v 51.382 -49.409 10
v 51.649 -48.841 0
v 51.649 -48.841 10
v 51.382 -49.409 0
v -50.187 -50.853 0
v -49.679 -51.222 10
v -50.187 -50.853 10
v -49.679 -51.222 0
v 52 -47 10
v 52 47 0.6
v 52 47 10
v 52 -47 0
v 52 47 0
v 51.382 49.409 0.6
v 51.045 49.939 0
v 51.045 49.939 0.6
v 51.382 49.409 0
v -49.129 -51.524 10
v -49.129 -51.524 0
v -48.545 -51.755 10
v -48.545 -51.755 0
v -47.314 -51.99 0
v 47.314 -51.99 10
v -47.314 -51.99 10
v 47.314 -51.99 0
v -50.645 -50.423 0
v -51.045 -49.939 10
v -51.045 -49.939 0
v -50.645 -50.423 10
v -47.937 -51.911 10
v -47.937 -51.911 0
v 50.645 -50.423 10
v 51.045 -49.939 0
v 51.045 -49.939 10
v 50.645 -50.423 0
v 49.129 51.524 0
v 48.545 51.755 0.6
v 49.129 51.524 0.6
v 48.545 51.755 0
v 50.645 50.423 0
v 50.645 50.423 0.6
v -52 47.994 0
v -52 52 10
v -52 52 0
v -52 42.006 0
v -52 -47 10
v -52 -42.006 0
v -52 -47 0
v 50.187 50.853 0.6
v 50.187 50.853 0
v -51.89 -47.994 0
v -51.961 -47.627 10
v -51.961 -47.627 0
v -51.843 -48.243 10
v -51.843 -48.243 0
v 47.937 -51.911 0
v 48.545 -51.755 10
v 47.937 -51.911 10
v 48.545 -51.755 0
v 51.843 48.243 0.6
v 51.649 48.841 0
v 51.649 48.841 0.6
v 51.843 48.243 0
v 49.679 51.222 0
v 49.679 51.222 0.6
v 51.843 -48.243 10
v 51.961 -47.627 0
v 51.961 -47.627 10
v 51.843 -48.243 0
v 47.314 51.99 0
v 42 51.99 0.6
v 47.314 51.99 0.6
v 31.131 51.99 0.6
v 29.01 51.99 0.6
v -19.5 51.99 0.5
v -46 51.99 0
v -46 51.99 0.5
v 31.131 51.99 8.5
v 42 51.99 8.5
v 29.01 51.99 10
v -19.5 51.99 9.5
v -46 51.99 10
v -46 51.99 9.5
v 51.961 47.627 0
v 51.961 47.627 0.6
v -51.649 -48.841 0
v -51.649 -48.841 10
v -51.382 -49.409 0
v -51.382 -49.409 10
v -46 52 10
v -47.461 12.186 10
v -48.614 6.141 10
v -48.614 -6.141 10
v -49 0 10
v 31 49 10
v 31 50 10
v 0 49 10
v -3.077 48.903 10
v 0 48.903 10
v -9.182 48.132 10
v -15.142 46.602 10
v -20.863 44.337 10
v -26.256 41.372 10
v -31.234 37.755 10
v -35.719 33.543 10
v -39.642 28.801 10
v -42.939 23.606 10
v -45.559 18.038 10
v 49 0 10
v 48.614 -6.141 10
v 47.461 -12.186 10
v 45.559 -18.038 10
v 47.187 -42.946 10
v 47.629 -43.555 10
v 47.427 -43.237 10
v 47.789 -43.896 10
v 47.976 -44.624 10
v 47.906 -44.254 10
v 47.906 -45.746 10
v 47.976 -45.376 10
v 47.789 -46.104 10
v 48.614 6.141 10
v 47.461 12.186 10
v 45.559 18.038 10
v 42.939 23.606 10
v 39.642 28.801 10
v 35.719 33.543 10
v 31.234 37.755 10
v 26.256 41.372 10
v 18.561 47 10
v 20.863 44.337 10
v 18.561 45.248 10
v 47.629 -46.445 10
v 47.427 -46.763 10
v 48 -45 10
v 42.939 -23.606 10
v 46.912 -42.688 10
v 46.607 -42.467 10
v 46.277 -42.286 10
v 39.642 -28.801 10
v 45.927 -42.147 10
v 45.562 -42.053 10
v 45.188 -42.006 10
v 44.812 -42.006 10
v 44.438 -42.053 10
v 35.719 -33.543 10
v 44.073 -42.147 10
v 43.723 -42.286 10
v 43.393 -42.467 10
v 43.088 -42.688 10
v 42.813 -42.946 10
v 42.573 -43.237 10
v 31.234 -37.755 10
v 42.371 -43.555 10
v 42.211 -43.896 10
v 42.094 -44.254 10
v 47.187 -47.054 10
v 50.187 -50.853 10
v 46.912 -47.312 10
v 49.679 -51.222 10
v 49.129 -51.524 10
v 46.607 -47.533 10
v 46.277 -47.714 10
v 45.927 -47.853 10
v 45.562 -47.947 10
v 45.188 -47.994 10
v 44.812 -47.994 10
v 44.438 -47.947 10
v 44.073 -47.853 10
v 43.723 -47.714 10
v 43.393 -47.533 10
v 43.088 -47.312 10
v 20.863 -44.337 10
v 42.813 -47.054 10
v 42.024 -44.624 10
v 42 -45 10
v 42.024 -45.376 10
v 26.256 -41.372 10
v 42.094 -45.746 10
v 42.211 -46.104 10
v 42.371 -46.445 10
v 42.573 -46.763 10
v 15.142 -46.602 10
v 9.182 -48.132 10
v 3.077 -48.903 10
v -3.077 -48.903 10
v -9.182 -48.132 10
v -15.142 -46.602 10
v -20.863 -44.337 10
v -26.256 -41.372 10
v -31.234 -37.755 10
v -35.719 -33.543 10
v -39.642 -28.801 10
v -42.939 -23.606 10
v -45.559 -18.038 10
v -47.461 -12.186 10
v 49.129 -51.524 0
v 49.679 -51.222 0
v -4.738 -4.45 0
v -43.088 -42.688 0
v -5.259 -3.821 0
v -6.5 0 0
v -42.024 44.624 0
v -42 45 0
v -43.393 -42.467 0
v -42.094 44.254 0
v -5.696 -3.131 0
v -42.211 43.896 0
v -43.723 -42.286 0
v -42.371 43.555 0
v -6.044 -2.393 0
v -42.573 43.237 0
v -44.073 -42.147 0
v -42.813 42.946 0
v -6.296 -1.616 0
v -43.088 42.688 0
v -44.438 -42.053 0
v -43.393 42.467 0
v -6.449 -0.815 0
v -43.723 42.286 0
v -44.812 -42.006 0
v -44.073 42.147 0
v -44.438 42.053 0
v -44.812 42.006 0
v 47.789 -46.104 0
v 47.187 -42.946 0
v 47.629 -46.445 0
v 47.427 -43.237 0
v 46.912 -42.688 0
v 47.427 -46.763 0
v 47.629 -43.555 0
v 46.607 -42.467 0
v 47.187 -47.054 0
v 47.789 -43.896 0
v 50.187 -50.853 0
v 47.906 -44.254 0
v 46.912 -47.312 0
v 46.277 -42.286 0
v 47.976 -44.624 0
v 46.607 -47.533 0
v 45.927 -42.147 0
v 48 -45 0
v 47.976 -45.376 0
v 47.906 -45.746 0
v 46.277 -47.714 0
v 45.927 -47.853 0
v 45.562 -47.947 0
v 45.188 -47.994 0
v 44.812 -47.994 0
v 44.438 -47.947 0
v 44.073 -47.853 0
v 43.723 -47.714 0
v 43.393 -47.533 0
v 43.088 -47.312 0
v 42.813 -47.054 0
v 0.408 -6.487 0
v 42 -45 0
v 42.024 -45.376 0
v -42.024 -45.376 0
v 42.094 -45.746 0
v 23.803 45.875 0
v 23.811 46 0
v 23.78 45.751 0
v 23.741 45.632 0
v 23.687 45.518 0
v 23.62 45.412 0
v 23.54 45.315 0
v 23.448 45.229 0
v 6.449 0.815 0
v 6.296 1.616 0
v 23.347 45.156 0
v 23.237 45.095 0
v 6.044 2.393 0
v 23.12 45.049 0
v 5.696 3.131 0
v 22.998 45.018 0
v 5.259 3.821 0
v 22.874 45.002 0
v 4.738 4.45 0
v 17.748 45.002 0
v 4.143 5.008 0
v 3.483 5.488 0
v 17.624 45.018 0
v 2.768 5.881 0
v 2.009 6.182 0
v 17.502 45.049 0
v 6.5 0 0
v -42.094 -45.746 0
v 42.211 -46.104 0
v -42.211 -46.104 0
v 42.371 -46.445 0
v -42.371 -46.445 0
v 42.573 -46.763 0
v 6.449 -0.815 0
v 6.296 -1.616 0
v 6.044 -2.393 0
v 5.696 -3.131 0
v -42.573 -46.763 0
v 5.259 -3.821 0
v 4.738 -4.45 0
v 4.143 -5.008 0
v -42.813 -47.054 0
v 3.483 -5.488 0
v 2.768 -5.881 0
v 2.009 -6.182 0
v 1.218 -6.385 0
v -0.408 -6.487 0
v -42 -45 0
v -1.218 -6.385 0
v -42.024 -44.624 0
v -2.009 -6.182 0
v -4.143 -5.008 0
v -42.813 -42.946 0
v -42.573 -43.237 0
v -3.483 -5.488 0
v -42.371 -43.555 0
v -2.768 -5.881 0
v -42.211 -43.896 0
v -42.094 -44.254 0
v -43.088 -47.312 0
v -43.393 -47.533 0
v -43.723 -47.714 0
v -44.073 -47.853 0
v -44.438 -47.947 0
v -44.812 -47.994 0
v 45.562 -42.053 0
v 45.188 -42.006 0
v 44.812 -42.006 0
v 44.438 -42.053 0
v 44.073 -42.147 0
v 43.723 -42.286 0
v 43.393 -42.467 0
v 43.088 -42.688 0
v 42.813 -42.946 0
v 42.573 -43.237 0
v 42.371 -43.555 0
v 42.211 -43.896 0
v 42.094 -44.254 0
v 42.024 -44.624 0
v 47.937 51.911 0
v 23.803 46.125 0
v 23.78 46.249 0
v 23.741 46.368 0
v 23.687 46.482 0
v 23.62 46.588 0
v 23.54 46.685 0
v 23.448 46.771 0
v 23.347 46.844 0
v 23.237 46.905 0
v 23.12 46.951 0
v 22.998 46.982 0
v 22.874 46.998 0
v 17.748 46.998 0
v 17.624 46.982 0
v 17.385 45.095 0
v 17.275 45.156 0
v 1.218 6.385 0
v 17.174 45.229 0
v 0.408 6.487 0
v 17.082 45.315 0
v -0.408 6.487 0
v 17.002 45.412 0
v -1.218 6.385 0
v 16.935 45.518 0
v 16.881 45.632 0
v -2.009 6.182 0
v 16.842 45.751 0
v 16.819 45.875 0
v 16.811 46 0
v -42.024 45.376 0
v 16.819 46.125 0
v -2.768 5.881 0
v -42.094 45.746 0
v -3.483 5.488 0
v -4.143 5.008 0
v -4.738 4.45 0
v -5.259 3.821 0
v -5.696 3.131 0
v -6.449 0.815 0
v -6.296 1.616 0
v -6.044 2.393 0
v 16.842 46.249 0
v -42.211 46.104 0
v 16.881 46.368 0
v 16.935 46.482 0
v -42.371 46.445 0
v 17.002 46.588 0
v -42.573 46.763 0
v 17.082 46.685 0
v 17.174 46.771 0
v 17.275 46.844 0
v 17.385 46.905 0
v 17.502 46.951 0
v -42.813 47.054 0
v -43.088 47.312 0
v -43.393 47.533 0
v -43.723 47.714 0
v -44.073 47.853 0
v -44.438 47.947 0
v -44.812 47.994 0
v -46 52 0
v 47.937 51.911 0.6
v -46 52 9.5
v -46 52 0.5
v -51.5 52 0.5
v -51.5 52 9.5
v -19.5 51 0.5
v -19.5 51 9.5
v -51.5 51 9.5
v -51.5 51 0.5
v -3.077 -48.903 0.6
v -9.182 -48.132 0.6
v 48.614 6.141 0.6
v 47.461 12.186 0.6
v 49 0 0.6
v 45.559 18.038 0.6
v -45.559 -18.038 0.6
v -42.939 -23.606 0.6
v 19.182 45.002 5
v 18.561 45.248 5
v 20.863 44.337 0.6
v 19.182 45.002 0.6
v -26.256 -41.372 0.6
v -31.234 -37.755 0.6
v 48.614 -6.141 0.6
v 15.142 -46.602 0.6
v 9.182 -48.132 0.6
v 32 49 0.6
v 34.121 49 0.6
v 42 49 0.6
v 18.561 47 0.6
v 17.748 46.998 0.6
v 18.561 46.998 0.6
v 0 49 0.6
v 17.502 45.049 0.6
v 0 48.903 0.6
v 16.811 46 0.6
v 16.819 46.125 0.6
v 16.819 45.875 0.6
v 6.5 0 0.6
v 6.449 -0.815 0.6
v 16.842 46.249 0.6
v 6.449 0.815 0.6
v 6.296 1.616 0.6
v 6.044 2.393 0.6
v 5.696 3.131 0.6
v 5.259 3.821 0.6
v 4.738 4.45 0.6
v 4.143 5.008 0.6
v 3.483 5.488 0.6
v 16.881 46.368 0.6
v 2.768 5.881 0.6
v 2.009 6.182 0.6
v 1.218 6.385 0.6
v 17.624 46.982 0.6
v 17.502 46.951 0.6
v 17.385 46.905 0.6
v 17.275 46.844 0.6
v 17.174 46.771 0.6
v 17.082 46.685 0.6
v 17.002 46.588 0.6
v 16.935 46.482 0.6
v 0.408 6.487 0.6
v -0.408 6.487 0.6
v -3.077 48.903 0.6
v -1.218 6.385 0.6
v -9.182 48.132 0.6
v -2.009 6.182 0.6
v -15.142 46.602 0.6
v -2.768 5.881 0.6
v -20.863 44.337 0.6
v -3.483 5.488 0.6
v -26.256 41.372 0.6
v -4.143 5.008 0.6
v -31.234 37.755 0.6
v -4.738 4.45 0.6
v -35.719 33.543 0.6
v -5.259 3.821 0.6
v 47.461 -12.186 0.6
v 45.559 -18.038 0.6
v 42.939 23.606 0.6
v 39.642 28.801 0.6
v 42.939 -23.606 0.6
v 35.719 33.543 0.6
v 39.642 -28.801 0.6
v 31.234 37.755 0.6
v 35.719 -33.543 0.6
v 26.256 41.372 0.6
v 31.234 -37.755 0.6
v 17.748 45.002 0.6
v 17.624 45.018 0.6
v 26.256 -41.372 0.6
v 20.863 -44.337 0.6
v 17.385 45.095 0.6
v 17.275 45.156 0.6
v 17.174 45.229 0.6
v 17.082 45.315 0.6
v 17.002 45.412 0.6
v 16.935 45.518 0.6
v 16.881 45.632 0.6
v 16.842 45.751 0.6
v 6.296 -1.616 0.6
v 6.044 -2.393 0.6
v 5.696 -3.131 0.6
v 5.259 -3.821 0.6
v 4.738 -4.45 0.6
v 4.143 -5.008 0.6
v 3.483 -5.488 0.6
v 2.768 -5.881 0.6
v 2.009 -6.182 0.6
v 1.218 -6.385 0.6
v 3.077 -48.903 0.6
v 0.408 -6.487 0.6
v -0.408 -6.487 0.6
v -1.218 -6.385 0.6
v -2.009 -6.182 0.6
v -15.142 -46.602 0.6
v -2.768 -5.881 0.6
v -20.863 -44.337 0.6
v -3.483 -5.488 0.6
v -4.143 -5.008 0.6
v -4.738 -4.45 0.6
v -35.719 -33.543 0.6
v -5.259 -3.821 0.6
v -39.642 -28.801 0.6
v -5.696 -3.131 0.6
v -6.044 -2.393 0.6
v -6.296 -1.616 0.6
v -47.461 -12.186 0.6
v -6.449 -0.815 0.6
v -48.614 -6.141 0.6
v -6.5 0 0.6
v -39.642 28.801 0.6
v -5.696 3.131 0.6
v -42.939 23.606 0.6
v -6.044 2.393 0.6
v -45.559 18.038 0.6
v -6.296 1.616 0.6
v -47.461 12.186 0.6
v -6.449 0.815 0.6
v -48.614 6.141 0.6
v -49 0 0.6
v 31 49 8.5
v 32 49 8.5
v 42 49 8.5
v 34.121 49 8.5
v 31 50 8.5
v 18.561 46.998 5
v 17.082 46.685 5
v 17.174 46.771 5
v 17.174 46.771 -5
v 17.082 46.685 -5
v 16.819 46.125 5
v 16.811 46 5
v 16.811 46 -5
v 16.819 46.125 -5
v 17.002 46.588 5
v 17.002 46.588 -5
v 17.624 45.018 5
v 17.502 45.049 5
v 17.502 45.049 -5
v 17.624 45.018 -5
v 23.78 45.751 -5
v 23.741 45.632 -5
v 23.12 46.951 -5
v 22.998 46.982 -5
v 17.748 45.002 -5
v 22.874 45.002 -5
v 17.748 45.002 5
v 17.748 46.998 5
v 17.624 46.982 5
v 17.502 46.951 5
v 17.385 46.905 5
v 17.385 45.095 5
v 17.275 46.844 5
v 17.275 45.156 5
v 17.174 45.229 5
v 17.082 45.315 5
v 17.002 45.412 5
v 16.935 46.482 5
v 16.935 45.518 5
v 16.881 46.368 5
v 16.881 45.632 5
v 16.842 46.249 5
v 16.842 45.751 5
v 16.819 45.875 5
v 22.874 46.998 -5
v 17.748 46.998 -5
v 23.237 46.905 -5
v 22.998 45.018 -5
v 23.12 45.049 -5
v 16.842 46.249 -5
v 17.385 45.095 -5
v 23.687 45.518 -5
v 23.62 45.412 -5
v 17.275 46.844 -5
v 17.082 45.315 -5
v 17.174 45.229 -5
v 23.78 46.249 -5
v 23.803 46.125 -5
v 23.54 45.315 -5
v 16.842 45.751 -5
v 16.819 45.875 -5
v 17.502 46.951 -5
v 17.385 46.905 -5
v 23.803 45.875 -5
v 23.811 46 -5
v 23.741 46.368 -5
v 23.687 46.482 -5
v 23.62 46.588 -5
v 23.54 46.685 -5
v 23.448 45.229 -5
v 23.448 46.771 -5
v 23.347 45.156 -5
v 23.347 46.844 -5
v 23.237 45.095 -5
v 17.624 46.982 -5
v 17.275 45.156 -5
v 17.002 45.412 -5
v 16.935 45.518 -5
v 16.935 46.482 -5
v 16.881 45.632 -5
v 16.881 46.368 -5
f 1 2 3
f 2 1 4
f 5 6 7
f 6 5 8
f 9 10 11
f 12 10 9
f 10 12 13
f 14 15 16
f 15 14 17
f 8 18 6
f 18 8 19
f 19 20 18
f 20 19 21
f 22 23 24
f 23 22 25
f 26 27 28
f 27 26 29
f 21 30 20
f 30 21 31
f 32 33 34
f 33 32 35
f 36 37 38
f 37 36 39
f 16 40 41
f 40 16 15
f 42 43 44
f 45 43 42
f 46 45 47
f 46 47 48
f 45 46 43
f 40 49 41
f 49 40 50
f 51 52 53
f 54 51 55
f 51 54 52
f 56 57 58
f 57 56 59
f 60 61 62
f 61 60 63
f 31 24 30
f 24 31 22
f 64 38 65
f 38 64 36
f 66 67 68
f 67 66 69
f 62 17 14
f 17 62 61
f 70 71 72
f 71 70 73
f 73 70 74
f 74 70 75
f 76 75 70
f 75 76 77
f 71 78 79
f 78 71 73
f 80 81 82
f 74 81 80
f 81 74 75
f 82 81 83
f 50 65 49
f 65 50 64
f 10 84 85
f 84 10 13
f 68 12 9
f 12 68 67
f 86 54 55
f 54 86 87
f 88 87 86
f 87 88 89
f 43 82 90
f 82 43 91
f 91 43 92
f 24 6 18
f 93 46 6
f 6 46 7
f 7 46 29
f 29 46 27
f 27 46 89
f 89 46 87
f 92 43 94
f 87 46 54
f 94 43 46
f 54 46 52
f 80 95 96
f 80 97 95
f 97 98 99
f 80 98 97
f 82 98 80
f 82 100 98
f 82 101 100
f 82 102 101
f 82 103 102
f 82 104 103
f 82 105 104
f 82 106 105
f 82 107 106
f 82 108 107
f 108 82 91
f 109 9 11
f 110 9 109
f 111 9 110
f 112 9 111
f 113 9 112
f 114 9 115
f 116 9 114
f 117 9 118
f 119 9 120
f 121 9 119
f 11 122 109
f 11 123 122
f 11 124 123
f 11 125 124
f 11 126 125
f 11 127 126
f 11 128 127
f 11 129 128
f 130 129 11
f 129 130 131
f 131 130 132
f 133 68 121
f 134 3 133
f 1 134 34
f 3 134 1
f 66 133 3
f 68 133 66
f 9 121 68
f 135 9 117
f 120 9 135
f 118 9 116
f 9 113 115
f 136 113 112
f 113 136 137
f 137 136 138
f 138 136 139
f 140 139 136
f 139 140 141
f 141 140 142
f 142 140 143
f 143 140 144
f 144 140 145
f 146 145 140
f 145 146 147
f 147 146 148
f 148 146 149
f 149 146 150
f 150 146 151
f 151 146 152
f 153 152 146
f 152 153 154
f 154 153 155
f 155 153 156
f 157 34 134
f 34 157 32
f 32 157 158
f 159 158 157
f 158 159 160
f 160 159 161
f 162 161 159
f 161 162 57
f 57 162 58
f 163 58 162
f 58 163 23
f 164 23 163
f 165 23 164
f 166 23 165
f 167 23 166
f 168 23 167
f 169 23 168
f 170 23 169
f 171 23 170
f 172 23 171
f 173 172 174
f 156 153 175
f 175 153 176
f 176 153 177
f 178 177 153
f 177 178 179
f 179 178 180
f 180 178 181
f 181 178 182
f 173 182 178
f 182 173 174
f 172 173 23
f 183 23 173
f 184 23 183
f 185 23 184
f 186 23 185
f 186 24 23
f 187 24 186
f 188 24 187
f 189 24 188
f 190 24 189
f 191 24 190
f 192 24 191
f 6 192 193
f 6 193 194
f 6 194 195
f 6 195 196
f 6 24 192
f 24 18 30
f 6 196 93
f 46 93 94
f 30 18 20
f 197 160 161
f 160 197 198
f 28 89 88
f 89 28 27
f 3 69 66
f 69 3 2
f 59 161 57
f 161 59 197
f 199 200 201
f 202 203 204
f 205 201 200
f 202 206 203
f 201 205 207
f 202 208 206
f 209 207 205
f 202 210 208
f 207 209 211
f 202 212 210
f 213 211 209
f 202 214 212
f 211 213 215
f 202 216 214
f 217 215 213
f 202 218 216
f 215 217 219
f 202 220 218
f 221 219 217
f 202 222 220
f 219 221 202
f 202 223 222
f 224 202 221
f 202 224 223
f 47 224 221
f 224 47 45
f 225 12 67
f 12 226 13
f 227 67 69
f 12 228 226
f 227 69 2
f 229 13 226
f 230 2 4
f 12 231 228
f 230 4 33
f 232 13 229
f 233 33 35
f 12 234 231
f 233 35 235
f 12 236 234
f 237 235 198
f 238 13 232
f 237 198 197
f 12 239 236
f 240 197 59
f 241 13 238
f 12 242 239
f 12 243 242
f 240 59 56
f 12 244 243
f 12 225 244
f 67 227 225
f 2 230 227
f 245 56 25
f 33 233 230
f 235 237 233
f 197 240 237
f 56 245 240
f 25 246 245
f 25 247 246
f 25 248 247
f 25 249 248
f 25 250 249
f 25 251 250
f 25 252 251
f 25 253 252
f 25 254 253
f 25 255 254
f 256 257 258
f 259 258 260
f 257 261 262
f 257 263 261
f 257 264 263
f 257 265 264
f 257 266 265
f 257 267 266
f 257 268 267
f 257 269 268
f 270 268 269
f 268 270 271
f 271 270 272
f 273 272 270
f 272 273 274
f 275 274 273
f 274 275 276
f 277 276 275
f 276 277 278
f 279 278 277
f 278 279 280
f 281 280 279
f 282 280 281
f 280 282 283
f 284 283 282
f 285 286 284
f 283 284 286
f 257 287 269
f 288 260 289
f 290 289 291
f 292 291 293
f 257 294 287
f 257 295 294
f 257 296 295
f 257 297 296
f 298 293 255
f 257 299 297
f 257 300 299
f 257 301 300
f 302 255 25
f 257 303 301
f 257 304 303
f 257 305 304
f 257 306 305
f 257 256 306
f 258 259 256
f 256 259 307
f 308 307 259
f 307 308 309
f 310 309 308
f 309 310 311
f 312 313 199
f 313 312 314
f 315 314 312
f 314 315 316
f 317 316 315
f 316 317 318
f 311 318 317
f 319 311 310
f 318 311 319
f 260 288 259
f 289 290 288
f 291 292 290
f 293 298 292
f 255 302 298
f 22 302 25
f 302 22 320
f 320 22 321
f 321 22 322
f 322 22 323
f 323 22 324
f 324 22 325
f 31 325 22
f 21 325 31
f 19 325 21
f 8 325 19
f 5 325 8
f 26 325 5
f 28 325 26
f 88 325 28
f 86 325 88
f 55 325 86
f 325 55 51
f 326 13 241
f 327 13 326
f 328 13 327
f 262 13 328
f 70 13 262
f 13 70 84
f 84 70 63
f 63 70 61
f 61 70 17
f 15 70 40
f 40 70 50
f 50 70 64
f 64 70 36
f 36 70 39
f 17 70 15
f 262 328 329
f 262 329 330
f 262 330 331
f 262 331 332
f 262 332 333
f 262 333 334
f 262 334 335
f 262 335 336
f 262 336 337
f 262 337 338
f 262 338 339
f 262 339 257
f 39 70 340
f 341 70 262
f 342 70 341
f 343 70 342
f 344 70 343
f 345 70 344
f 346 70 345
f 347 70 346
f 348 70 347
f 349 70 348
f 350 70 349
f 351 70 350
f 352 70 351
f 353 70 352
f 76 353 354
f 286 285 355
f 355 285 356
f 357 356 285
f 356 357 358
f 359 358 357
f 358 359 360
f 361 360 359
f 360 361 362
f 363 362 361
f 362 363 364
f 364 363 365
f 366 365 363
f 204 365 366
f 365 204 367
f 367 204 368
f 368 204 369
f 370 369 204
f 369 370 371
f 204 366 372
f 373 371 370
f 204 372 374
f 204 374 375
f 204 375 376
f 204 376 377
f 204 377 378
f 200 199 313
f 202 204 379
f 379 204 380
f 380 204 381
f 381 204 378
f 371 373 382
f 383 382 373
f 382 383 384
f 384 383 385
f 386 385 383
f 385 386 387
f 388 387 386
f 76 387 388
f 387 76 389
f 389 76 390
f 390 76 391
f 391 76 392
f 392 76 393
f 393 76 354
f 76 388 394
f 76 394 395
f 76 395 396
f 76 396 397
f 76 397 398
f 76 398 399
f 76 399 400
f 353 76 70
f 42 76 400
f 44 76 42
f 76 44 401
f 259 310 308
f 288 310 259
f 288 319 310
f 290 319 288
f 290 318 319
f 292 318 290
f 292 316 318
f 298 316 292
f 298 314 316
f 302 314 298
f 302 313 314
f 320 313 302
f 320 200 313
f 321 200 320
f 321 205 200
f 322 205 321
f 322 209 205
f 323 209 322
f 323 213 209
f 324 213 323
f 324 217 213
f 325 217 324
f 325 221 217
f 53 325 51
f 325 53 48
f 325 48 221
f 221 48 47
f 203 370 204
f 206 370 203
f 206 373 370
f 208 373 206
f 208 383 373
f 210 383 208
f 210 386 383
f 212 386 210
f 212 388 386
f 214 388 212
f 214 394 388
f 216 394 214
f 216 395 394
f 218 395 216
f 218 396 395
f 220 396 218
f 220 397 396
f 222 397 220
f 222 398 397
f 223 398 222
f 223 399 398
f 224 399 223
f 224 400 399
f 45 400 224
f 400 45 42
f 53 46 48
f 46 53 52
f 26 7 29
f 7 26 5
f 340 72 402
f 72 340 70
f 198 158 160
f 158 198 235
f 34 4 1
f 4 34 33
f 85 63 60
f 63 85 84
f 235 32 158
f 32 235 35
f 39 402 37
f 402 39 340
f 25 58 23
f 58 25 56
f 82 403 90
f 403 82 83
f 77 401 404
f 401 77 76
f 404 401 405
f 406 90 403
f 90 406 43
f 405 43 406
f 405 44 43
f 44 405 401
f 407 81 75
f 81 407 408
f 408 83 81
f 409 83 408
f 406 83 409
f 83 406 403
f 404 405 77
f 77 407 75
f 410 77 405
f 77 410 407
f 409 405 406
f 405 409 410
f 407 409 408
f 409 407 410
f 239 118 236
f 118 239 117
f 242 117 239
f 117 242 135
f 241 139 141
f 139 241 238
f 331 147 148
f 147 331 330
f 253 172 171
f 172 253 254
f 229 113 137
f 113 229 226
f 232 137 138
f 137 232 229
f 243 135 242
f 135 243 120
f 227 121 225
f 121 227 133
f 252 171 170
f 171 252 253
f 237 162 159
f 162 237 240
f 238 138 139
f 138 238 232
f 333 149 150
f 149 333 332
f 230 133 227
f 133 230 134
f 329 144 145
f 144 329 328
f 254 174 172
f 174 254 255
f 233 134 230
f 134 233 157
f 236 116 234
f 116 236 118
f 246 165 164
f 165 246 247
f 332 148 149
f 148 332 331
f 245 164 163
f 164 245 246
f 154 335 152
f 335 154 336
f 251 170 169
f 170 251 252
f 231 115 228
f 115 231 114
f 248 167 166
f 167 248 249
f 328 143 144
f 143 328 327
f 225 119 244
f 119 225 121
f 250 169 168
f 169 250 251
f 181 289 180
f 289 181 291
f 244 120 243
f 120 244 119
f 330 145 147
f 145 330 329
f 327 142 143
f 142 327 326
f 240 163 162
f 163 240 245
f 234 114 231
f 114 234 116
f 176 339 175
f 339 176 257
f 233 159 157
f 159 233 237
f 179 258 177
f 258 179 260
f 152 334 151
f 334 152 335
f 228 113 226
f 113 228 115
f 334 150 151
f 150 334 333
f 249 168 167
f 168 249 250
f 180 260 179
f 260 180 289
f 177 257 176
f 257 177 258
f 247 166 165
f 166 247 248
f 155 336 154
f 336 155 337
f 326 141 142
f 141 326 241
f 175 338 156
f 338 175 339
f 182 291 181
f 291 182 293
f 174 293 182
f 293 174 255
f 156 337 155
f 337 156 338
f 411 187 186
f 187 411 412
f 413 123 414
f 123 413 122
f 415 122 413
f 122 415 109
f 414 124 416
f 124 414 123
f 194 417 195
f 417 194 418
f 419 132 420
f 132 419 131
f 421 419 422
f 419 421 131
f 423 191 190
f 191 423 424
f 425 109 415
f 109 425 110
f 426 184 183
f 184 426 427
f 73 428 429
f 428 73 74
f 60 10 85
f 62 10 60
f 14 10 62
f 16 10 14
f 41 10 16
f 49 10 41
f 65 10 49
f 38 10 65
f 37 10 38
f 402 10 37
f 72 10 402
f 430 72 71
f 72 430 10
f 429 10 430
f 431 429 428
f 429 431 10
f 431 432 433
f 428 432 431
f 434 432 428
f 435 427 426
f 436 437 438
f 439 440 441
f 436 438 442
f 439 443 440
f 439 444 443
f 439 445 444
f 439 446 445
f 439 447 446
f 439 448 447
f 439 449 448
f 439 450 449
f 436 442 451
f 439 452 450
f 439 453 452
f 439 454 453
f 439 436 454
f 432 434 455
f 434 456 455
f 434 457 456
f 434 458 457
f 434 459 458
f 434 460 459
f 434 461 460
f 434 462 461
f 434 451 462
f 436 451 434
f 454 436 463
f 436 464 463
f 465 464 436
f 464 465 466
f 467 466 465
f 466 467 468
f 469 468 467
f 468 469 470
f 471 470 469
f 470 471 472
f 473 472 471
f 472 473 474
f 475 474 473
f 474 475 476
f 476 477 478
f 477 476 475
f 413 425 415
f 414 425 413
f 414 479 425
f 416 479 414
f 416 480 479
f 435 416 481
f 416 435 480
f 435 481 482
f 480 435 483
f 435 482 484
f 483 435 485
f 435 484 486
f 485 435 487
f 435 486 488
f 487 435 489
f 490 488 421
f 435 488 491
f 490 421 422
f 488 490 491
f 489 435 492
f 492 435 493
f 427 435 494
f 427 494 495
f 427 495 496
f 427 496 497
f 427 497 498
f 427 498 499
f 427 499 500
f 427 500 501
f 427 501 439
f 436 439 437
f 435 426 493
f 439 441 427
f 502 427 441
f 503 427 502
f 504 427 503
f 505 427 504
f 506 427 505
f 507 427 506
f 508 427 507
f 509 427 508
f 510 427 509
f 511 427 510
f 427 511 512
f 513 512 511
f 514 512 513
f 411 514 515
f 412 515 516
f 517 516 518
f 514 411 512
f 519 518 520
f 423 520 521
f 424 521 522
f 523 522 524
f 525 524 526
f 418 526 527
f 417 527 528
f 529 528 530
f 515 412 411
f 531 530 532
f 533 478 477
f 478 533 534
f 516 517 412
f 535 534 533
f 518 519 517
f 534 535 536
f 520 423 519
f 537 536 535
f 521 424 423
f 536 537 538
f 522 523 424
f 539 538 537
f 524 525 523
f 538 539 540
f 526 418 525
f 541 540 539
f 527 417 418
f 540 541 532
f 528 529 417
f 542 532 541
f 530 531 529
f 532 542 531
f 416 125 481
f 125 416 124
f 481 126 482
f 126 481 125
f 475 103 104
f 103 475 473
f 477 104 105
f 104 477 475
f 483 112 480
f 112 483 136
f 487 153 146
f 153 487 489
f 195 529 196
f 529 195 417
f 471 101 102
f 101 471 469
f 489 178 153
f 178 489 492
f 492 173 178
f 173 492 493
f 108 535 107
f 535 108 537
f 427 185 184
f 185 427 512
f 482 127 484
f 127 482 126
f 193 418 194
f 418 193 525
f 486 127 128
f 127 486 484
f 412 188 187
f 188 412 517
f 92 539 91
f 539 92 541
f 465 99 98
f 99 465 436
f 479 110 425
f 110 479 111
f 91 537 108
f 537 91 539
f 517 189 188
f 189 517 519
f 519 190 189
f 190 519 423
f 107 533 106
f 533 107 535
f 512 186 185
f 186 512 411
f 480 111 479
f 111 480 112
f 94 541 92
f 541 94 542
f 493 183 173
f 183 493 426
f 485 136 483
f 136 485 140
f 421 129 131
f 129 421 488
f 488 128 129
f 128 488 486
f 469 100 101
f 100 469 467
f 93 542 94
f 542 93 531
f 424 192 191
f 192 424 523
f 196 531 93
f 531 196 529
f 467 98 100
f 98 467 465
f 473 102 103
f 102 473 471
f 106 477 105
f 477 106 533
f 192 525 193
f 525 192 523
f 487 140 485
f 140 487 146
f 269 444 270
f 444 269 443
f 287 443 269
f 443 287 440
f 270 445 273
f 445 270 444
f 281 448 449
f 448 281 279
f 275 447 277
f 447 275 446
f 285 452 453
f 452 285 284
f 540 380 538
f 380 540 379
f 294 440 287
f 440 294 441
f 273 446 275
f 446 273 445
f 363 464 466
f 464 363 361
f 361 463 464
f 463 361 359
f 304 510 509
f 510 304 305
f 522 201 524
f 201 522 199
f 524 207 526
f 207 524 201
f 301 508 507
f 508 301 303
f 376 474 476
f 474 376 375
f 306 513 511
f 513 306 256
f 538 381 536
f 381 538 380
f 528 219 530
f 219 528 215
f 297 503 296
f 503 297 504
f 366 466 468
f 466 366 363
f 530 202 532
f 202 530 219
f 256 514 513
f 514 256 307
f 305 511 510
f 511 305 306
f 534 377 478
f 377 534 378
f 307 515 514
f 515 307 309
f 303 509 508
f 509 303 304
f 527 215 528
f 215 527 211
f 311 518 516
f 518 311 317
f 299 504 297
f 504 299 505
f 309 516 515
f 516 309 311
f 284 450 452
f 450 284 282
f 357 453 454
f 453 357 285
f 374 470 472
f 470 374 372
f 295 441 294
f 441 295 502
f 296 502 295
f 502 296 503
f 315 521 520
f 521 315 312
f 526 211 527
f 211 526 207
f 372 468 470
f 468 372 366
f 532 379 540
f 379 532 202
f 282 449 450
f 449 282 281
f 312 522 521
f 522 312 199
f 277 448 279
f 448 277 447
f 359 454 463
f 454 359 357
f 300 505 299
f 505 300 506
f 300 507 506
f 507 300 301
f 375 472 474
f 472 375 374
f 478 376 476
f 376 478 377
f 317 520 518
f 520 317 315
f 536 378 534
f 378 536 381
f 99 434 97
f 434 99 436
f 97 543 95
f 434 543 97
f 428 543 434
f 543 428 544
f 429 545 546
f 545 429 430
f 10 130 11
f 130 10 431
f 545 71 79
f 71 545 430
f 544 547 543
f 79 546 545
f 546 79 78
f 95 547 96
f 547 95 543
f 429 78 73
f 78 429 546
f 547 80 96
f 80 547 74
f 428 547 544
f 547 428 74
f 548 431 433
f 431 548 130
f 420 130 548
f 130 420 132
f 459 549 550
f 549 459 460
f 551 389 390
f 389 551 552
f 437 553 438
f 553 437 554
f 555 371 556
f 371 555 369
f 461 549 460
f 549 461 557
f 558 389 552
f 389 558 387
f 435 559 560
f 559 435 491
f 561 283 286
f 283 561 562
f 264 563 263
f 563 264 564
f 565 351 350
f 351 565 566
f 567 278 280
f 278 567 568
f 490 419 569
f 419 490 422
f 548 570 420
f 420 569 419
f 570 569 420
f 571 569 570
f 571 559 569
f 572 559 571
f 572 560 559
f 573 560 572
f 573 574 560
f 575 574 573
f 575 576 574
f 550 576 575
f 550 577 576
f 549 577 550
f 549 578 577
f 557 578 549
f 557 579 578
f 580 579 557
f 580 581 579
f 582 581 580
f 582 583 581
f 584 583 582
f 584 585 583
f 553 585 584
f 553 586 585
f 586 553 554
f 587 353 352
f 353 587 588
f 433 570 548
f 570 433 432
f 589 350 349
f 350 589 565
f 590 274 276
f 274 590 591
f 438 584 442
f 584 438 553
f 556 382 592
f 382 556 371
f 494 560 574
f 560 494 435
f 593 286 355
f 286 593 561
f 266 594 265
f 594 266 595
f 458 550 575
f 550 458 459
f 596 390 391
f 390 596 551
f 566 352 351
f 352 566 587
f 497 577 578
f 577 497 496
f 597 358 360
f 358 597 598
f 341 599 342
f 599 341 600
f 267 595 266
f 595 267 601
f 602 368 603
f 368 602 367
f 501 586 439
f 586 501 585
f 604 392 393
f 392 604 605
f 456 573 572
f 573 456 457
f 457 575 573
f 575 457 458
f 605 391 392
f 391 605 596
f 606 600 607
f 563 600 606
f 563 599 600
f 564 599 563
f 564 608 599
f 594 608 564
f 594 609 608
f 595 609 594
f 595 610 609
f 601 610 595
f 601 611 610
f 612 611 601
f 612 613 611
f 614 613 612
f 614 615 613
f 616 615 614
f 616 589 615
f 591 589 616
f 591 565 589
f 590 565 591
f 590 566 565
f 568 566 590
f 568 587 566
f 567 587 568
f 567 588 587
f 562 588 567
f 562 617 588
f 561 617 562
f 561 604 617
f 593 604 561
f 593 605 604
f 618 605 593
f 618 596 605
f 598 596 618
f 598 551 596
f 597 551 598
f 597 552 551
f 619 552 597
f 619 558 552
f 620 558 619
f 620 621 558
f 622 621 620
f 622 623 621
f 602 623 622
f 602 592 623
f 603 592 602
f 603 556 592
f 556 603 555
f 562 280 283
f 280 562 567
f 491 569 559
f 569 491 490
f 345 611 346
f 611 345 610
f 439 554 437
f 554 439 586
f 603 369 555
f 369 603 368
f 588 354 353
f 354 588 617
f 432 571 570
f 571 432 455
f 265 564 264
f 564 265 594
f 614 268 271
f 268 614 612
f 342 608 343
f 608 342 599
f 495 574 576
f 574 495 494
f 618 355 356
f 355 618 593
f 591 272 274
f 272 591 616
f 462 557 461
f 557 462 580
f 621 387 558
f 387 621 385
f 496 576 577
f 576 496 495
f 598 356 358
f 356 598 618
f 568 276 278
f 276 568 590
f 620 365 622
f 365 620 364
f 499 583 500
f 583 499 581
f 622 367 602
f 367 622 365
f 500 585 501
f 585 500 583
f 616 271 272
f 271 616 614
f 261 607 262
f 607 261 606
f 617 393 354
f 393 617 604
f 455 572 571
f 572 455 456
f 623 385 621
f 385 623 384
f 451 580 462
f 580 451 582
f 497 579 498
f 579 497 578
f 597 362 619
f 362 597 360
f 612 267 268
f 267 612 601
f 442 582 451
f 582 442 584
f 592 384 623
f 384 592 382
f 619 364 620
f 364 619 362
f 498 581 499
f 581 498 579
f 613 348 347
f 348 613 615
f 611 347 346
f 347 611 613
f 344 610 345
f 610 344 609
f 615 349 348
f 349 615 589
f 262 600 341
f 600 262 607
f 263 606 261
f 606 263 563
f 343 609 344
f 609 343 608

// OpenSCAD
$fn = 50;


union() {
	difference() {
		union() {
			hull() {
				translate(v = [-47.0000000000, 47.0000000000, 0]) {
					cylinder(h = 10, r = 5);
				}
				translate(v = [47.0000000000, 47.0000000000, 0]) {
					cylinder(h = 10, r = 5);
				}
				translate(v = [-47.0000000000, -47.0000000000, 0]) {
					cylinder(h = 10, r = 5);
				}
				translate(v = [47.0000000000, -47.0000000000, 0]) {
					cylinder(h = 10, r = 5);
				}
			}
			translate(v = [-52.0000000000, 46.0000000000, 0]) {
				cube(size = [6, 6, 10]);
			}
		}
		union() {
			translate(v = [-52.5000000000, -45.0000000000, -250.0000000000]) {
				rotate(a = [0, 0, 0]) {
					difference() {
						union() {
							hull() {
								translate(v = [7.5000000000, 0, 0]) {
									cylinder(h = 250, r = 3.0000000000, r1 = 3.0000000000, r2 = 3.0000000000);
								}
								translate(v = [-7.5000000000, 0, 0]) {
									cylinder(h = 250, r = 3.0000000000, r1 = 3.0000000000, r2 = 3.0000000000);
								}
							}
						}
						union();
					}
				}
			}
			translate(v = [-52.5000000000, 45.0000000000, -250.0000000000]) {
				rotate(a = [0, 0, 0]) {
					difference() {
						union() {
							hull() {
								translate(v = [7.5000000000, 0, 0]) {
									cylinder(h = 250, r = 3.0000000000, r1 = 3.0000000000, r2 = 3.0000000000);
								}
								translate(v = [-7.5000000000, 0, 0]) {
									cylinder(h = 250, r = 3.0000000000, r1 = 3.0000000000, r2 = 3.0000000000);
								}
							}
						}
						union();
					}
				}
			}
			translate(v = [-51.5000000000, 51.0000000000, 0.5000000000]) {
				cube(size = [32, 1, 9.0000000000]);
			}
			translate(v = [45.0000000000, -45.0000000000, 0]) {
				cylinder(h = 100, r = 3.0000000000);
			}
			translate(v = [0, 0, 0.6000000000]) {
				cylinder(h = 12.4000000000, r = 49.0000000000);
			}
			translate(v = [0, 0, -5.0000000000]) {
				cylinder(h = 10, r = 6.5000000000);
			}
			translate(v = [0.0000000000, 47.0000000000, 0.6000000000]) {
				cube(size = [52.0000000000, 2, 12.4000000000]);
			}
			translate(v = [42.0000000000, 47.0000000000, 0.6000000000]) {
				cube(size = [10, 5, 12.4000000000]);
			}
			translate(v = [31.0000000000, 47.0000000000, 8.5000000000]) {
				cube(size = [21, 5, 1.5000000000]);
			}
			translate(v = [28.2500000000, 52.7500000000, 0.6000000000]) {
				rotate(a = [0, 0, -45]) {
					cube(size = [7.5000000000, 1.5000000000, 12.4000000000]);
				}
			}
			translate(v = [11.0610000000, 45.0000000000, 0.6000000000]) {
				cube(size = [7.5000000000, 2, 9.4000000000]);
			}
		}
	}
	union() {
		translate(v = [20.3110000000, 46.0000000000, -5.0000000000]) {
			rotate(a = [0, 0, 0]) {
				difference() {
					union() {
						#hull() {
							#translate(v = [2.5000000000, 0, 0]) {
								cylinder(h = 10, r = 1.0000000000, r1 = 1.0000000000, r2 = 1.0000000000);
							}
							#translate(v = [-2.5000000000, 0, 0]) {
								cylinder(h = 10, r = 1.0000000000, r1 = 1.0000000000, r2 = 1.0000000000);
							}
						}
					}
					union();
				}
			}
		}
	}
}
